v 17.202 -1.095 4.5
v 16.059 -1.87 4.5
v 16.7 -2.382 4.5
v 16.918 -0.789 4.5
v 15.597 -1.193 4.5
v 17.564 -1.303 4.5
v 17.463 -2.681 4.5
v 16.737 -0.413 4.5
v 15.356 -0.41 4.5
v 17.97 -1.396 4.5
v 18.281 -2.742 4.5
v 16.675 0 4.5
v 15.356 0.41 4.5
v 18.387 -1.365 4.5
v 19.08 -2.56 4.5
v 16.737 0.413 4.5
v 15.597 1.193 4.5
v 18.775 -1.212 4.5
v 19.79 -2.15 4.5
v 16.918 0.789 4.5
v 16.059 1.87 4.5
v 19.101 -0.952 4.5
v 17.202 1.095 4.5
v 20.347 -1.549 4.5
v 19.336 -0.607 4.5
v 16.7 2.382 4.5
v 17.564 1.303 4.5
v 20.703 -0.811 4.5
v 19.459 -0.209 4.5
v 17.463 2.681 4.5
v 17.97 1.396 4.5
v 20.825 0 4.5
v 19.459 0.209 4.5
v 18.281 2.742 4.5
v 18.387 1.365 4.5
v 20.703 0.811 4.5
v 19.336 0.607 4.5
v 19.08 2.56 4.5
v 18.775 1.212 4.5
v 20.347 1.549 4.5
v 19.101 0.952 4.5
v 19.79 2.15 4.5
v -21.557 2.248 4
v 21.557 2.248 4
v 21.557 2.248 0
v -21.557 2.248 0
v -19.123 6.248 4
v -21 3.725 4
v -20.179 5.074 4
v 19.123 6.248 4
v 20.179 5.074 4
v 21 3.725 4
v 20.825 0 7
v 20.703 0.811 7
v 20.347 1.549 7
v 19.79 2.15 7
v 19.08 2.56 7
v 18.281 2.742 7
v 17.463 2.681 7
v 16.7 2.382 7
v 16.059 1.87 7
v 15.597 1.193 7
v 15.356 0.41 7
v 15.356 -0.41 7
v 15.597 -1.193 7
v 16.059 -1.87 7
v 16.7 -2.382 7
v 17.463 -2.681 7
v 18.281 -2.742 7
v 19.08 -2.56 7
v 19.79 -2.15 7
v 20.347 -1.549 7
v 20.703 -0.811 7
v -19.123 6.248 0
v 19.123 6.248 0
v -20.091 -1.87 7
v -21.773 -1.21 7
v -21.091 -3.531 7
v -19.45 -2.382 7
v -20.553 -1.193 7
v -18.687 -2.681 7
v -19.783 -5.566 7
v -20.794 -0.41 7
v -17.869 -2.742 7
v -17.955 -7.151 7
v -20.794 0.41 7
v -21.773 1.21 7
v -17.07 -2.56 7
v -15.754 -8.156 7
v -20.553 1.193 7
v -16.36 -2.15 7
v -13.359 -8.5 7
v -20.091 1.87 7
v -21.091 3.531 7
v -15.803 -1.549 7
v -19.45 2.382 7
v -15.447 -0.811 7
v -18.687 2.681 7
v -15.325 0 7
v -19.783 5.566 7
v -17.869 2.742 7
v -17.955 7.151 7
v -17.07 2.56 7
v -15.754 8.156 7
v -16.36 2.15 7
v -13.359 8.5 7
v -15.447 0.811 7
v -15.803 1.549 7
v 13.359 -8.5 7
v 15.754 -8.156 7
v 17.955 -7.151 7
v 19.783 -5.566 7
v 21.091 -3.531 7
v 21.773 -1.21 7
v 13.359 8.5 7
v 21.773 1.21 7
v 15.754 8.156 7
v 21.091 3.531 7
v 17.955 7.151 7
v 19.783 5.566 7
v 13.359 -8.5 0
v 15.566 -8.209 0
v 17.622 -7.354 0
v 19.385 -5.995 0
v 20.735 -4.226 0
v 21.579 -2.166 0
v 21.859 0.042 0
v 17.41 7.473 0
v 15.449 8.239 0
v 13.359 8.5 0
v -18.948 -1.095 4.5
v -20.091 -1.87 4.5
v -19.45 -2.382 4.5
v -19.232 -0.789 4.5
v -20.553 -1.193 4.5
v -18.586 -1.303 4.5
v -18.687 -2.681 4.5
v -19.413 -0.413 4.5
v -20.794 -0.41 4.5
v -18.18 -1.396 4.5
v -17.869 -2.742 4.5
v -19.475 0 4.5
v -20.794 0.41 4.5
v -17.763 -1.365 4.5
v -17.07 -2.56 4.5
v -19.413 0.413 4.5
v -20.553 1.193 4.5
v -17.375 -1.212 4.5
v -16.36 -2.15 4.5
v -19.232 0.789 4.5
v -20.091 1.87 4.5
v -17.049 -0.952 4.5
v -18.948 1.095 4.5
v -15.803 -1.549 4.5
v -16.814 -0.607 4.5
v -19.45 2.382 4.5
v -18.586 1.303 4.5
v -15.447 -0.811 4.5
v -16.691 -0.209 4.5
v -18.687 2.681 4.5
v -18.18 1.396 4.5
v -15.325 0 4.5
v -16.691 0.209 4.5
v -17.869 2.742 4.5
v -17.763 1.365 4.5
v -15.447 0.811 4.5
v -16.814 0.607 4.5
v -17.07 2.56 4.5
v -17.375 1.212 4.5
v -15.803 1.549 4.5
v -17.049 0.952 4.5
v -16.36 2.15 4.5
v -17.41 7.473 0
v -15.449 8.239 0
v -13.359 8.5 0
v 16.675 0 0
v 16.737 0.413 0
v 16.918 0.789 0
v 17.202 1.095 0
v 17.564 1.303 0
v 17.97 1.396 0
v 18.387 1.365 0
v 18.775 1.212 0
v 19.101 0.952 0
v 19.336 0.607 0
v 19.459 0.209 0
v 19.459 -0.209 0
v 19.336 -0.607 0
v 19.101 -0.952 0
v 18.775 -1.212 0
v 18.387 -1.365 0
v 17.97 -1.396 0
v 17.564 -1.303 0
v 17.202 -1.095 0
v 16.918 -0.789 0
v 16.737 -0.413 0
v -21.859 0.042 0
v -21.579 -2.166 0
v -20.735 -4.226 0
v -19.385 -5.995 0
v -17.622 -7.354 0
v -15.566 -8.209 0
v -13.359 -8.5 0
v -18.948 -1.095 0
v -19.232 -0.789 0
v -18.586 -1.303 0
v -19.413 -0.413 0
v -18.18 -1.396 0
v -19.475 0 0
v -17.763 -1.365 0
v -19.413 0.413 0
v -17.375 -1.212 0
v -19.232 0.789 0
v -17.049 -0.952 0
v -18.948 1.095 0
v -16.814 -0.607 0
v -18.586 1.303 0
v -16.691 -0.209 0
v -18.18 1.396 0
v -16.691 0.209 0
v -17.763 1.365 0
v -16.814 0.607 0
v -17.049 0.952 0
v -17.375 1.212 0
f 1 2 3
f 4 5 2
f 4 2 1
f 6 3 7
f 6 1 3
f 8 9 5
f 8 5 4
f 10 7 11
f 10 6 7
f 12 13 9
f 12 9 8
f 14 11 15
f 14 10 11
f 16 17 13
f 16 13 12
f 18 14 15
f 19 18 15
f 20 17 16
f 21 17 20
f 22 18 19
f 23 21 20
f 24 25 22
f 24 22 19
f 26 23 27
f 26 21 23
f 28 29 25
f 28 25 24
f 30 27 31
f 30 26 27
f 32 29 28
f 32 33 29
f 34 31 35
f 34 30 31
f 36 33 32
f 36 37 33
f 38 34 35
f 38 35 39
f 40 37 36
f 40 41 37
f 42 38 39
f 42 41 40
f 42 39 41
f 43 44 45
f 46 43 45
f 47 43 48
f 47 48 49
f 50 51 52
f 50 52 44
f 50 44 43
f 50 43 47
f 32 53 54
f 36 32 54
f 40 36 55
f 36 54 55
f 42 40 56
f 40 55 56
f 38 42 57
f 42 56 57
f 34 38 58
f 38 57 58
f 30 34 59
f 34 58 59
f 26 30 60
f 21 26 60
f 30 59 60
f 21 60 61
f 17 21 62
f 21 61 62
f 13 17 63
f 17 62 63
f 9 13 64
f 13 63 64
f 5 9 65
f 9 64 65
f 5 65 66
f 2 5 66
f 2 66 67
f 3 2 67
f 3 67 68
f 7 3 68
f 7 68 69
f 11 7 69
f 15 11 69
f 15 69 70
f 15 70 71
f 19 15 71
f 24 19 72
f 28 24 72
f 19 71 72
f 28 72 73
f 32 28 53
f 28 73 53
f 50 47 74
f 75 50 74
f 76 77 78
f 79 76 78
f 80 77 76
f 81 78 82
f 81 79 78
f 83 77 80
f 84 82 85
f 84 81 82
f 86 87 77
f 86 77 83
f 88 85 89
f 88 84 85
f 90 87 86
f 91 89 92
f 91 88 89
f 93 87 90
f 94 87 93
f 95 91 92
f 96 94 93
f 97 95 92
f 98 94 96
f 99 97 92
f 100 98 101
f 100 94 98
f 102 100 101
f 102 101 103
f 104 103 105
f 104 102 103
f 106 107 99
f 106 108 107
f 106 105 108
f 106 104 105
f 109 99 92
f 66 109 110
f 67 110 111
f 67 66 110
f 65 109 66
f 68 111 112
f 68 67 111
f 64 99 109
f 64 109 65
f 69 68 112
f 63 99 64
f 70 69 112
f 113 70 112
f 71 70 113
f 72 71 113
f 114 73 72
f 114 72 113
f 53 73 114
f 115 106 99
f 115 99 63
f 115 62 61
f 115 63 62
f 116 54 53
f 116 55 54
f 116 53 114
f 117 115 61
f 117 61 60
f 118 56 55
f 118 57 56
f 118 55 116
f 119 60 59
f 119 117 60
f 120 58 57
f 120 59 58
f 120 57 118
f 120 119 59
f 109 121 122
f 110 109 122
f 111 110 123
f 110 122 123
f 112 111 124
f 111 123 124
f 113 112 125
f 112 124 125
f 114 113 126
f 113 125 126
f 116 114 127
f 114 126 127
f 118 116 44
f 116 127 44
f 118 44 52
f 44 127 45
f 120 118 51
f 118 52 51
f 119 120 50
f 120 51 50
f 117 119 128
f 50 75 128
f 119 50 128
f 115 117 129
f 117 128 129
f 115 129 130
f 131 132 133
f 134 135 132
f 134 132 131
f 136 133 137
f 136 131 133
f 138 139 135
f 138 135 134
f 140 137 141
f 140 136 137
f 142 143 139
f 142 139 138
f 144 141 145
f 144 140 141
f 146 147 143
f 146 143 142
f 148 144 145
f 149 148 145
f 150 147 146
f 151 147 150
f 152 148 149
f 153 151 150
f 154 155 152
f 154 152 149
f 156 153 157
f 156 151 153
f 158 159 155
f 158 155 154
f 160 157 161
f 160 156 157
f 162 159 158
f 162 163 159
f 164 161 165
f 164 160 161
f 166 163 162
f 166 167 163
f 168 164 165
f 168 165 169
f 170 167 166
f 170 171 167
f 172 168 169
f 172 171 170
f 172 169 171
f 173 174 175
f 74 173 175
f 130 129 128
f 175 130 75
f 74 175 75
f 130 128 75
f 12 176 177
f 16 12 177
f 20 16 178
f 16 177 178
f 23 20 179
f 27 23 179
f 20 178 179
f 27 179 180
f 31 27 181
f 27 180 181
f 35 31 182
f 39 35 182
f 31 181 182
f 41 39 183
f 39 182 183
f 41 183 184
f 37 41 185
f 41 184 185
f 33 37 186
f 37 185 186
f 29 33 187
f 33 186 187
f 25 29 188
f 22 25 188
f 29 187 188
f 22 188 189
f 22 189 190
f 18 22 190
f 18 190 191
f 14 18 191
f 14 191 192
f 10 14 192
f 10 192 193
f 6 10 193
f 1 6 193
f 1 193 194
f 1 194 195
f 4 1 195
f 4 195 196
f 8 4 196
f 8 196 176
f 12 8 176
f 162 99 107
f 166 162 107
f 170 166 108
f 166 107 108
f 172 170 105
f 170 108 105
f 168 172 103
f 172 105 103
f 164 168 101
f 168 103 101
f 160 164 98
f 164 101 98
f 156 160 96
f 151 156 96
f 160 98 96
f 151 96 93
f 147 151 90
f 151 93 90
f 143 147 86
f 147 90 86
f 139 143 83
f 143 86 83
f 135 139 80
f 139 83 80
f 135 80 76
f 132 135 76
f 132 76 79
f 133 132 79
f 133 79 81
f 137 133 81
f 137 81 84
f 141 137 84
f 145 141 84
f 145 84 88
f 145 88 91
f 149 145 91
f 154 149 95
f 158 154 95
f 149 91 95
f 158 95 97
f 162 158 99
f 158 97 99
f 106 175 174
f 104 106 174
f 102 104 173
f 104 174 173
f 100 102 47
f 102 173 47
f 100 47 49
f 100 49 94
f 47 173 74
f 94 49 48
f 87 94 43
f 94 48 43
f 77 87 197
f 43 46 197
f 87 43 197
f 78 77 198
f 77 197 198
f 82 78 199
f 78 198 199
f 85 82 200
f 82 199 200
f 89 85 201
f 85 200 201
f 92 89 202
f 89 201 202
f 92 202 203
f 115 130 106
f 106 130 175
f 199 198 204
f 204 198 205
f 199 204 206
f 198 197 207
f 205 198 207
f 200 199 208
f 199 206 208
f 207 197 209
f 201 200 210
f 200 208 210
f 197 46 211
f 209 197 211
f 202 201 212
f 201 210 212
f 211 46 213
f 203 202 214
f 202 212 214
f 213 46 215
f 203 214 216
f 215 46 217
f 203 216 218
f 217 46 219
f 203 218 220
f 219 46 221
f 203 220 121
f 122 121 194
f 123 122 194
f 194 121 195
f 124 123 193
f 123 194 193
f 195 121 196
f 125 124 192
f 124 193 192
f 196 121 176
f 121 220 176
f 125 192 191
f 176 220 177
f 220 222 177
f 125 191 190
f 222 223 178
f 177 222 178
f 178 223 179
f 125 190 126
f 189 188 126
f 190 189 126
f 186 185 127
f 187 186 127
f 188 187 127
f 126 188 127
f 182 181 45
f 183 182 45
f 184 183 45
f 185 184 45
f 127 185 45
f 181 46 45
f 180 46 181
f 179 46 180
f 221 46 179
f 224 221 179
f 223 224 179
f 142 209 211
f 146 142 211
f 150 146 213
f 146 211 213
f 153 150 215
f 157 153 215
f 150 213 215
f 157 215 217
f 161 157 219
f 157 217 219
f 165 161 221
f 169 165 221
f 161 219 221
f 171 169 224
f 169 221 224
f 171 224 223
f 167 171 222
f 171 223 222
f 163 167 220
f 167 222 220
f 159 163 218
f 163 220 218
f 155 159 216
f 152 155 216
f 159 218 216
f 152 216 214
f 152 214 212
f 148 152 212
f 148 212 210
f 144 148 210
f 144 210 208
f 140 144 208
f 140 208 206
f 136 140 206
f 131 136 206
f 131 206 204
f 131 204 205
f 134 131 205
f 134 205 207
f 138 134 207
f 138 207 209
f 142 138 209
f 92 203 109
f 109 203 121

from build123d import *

# Parameters (mm, degrees)
BOSS_EXTRUDE1_DEPTH     = 7
SKETCH3_W               = 8
SKETCH3_H               = 4
CUT_EXTRUDE1_DEPTH      = 6.459407384
CUT_EXTRUDE1_DEPTH_BACK = 39.259407384
SKETCH6_R               = 1.4
CUT_EXTRUDE3_DEPTH      = 1
CUT_EXTRUDE3_DEPTH_BACK = 8
SKETCH8_R               = 2.75
CUT_EXTRUDE4_DEPTH      = 1
CUT_EXTRUDE4_DEPTH_BACK = 2.5


with BuildPart() as part:
    # Sketch1 → Boss-Extrude1 (new body)
    with BuildSketch(Plane.XY):
        with BuildLine():
            Line((-13.359407384, -8.5), (13.359407384, -8.5))
            ThreePointArc((13.359407384, -8.5), (21.859407384, 0), (13.359407384, 8.5))
            Line((13.359407384, 8.5), (-13.359407384, 8.5))
            ThreePointArc((-13.359407384, 8.5), (-21.859407384, 0), (-13.359407384, -8.5))
        make_face()
    extrude(amount=BOSS_EXTRUDE1_DEPTH)

    # Sketch3 → Cut-Extrude1 (cut, two sides)
    with BuildSketch(Plane(origin=(16.4, 0, 0), x_dir=(0, 0, -1), z_dir=(1, 0, 0))) as cut_extrude1_sk:
        with Locations((0, 4.247574753)):
            Rectangle(SKETCH3_W, SKETCH3_H)
    extrude(amount=CUT_EXTRUDE1_DEPTH, mode=Mode.SUBTRACT)
    extrude(cut_extrude1_sk.sketch, amount=-CUT_EXTRUDE1_DEPTH_BACK, mode=Mode.SUBTRACT)

    # Sketch6 → Cut-Extrude3 (cut, two sides)
    with BuildSketch(Plane(origin=(0, 0, 0), x_dir=(-1, 0, 0), z_dir=(0, 0, -1))) as cut_extrude3_sk:
        with Locations((-18.075, 0)):
            Circle(SKETCH6_R)
        with Locations((18.075, 0)):
            Circle(SKETCH6_R)
    extrude(amount=CUT_EXTRUDE3_DEPTH, mode=Mode.SUBTRACT)
    extrude(cut_extrude3_sk.sketch, amount=-CUT_EXTRUDE3_DEPTH_BACK, mode=Mode.SUBTRACT)

    # Sketch8 → Cut-Extrude4 (cut, two sides)
    with BuildSketch(Plane.XY.offset(7)) as cut_extrude4_sk:
        with Locations((-18.075, 0)):
            Circle(SKETCH8_R)
        with Locations((18.075, 0)):
            Circle(SKETCH8_R)
    extrude(amount=CUT_EXTRUDE4_DEPTH, mode=Mode.SUBTRACT)
    extrude(cut_extrude4_sk.sketch, amount=-CUT_EXTRUDE4_DEPTH_BACK, mode=Mode.SUBTRACT)


solid = part.part
